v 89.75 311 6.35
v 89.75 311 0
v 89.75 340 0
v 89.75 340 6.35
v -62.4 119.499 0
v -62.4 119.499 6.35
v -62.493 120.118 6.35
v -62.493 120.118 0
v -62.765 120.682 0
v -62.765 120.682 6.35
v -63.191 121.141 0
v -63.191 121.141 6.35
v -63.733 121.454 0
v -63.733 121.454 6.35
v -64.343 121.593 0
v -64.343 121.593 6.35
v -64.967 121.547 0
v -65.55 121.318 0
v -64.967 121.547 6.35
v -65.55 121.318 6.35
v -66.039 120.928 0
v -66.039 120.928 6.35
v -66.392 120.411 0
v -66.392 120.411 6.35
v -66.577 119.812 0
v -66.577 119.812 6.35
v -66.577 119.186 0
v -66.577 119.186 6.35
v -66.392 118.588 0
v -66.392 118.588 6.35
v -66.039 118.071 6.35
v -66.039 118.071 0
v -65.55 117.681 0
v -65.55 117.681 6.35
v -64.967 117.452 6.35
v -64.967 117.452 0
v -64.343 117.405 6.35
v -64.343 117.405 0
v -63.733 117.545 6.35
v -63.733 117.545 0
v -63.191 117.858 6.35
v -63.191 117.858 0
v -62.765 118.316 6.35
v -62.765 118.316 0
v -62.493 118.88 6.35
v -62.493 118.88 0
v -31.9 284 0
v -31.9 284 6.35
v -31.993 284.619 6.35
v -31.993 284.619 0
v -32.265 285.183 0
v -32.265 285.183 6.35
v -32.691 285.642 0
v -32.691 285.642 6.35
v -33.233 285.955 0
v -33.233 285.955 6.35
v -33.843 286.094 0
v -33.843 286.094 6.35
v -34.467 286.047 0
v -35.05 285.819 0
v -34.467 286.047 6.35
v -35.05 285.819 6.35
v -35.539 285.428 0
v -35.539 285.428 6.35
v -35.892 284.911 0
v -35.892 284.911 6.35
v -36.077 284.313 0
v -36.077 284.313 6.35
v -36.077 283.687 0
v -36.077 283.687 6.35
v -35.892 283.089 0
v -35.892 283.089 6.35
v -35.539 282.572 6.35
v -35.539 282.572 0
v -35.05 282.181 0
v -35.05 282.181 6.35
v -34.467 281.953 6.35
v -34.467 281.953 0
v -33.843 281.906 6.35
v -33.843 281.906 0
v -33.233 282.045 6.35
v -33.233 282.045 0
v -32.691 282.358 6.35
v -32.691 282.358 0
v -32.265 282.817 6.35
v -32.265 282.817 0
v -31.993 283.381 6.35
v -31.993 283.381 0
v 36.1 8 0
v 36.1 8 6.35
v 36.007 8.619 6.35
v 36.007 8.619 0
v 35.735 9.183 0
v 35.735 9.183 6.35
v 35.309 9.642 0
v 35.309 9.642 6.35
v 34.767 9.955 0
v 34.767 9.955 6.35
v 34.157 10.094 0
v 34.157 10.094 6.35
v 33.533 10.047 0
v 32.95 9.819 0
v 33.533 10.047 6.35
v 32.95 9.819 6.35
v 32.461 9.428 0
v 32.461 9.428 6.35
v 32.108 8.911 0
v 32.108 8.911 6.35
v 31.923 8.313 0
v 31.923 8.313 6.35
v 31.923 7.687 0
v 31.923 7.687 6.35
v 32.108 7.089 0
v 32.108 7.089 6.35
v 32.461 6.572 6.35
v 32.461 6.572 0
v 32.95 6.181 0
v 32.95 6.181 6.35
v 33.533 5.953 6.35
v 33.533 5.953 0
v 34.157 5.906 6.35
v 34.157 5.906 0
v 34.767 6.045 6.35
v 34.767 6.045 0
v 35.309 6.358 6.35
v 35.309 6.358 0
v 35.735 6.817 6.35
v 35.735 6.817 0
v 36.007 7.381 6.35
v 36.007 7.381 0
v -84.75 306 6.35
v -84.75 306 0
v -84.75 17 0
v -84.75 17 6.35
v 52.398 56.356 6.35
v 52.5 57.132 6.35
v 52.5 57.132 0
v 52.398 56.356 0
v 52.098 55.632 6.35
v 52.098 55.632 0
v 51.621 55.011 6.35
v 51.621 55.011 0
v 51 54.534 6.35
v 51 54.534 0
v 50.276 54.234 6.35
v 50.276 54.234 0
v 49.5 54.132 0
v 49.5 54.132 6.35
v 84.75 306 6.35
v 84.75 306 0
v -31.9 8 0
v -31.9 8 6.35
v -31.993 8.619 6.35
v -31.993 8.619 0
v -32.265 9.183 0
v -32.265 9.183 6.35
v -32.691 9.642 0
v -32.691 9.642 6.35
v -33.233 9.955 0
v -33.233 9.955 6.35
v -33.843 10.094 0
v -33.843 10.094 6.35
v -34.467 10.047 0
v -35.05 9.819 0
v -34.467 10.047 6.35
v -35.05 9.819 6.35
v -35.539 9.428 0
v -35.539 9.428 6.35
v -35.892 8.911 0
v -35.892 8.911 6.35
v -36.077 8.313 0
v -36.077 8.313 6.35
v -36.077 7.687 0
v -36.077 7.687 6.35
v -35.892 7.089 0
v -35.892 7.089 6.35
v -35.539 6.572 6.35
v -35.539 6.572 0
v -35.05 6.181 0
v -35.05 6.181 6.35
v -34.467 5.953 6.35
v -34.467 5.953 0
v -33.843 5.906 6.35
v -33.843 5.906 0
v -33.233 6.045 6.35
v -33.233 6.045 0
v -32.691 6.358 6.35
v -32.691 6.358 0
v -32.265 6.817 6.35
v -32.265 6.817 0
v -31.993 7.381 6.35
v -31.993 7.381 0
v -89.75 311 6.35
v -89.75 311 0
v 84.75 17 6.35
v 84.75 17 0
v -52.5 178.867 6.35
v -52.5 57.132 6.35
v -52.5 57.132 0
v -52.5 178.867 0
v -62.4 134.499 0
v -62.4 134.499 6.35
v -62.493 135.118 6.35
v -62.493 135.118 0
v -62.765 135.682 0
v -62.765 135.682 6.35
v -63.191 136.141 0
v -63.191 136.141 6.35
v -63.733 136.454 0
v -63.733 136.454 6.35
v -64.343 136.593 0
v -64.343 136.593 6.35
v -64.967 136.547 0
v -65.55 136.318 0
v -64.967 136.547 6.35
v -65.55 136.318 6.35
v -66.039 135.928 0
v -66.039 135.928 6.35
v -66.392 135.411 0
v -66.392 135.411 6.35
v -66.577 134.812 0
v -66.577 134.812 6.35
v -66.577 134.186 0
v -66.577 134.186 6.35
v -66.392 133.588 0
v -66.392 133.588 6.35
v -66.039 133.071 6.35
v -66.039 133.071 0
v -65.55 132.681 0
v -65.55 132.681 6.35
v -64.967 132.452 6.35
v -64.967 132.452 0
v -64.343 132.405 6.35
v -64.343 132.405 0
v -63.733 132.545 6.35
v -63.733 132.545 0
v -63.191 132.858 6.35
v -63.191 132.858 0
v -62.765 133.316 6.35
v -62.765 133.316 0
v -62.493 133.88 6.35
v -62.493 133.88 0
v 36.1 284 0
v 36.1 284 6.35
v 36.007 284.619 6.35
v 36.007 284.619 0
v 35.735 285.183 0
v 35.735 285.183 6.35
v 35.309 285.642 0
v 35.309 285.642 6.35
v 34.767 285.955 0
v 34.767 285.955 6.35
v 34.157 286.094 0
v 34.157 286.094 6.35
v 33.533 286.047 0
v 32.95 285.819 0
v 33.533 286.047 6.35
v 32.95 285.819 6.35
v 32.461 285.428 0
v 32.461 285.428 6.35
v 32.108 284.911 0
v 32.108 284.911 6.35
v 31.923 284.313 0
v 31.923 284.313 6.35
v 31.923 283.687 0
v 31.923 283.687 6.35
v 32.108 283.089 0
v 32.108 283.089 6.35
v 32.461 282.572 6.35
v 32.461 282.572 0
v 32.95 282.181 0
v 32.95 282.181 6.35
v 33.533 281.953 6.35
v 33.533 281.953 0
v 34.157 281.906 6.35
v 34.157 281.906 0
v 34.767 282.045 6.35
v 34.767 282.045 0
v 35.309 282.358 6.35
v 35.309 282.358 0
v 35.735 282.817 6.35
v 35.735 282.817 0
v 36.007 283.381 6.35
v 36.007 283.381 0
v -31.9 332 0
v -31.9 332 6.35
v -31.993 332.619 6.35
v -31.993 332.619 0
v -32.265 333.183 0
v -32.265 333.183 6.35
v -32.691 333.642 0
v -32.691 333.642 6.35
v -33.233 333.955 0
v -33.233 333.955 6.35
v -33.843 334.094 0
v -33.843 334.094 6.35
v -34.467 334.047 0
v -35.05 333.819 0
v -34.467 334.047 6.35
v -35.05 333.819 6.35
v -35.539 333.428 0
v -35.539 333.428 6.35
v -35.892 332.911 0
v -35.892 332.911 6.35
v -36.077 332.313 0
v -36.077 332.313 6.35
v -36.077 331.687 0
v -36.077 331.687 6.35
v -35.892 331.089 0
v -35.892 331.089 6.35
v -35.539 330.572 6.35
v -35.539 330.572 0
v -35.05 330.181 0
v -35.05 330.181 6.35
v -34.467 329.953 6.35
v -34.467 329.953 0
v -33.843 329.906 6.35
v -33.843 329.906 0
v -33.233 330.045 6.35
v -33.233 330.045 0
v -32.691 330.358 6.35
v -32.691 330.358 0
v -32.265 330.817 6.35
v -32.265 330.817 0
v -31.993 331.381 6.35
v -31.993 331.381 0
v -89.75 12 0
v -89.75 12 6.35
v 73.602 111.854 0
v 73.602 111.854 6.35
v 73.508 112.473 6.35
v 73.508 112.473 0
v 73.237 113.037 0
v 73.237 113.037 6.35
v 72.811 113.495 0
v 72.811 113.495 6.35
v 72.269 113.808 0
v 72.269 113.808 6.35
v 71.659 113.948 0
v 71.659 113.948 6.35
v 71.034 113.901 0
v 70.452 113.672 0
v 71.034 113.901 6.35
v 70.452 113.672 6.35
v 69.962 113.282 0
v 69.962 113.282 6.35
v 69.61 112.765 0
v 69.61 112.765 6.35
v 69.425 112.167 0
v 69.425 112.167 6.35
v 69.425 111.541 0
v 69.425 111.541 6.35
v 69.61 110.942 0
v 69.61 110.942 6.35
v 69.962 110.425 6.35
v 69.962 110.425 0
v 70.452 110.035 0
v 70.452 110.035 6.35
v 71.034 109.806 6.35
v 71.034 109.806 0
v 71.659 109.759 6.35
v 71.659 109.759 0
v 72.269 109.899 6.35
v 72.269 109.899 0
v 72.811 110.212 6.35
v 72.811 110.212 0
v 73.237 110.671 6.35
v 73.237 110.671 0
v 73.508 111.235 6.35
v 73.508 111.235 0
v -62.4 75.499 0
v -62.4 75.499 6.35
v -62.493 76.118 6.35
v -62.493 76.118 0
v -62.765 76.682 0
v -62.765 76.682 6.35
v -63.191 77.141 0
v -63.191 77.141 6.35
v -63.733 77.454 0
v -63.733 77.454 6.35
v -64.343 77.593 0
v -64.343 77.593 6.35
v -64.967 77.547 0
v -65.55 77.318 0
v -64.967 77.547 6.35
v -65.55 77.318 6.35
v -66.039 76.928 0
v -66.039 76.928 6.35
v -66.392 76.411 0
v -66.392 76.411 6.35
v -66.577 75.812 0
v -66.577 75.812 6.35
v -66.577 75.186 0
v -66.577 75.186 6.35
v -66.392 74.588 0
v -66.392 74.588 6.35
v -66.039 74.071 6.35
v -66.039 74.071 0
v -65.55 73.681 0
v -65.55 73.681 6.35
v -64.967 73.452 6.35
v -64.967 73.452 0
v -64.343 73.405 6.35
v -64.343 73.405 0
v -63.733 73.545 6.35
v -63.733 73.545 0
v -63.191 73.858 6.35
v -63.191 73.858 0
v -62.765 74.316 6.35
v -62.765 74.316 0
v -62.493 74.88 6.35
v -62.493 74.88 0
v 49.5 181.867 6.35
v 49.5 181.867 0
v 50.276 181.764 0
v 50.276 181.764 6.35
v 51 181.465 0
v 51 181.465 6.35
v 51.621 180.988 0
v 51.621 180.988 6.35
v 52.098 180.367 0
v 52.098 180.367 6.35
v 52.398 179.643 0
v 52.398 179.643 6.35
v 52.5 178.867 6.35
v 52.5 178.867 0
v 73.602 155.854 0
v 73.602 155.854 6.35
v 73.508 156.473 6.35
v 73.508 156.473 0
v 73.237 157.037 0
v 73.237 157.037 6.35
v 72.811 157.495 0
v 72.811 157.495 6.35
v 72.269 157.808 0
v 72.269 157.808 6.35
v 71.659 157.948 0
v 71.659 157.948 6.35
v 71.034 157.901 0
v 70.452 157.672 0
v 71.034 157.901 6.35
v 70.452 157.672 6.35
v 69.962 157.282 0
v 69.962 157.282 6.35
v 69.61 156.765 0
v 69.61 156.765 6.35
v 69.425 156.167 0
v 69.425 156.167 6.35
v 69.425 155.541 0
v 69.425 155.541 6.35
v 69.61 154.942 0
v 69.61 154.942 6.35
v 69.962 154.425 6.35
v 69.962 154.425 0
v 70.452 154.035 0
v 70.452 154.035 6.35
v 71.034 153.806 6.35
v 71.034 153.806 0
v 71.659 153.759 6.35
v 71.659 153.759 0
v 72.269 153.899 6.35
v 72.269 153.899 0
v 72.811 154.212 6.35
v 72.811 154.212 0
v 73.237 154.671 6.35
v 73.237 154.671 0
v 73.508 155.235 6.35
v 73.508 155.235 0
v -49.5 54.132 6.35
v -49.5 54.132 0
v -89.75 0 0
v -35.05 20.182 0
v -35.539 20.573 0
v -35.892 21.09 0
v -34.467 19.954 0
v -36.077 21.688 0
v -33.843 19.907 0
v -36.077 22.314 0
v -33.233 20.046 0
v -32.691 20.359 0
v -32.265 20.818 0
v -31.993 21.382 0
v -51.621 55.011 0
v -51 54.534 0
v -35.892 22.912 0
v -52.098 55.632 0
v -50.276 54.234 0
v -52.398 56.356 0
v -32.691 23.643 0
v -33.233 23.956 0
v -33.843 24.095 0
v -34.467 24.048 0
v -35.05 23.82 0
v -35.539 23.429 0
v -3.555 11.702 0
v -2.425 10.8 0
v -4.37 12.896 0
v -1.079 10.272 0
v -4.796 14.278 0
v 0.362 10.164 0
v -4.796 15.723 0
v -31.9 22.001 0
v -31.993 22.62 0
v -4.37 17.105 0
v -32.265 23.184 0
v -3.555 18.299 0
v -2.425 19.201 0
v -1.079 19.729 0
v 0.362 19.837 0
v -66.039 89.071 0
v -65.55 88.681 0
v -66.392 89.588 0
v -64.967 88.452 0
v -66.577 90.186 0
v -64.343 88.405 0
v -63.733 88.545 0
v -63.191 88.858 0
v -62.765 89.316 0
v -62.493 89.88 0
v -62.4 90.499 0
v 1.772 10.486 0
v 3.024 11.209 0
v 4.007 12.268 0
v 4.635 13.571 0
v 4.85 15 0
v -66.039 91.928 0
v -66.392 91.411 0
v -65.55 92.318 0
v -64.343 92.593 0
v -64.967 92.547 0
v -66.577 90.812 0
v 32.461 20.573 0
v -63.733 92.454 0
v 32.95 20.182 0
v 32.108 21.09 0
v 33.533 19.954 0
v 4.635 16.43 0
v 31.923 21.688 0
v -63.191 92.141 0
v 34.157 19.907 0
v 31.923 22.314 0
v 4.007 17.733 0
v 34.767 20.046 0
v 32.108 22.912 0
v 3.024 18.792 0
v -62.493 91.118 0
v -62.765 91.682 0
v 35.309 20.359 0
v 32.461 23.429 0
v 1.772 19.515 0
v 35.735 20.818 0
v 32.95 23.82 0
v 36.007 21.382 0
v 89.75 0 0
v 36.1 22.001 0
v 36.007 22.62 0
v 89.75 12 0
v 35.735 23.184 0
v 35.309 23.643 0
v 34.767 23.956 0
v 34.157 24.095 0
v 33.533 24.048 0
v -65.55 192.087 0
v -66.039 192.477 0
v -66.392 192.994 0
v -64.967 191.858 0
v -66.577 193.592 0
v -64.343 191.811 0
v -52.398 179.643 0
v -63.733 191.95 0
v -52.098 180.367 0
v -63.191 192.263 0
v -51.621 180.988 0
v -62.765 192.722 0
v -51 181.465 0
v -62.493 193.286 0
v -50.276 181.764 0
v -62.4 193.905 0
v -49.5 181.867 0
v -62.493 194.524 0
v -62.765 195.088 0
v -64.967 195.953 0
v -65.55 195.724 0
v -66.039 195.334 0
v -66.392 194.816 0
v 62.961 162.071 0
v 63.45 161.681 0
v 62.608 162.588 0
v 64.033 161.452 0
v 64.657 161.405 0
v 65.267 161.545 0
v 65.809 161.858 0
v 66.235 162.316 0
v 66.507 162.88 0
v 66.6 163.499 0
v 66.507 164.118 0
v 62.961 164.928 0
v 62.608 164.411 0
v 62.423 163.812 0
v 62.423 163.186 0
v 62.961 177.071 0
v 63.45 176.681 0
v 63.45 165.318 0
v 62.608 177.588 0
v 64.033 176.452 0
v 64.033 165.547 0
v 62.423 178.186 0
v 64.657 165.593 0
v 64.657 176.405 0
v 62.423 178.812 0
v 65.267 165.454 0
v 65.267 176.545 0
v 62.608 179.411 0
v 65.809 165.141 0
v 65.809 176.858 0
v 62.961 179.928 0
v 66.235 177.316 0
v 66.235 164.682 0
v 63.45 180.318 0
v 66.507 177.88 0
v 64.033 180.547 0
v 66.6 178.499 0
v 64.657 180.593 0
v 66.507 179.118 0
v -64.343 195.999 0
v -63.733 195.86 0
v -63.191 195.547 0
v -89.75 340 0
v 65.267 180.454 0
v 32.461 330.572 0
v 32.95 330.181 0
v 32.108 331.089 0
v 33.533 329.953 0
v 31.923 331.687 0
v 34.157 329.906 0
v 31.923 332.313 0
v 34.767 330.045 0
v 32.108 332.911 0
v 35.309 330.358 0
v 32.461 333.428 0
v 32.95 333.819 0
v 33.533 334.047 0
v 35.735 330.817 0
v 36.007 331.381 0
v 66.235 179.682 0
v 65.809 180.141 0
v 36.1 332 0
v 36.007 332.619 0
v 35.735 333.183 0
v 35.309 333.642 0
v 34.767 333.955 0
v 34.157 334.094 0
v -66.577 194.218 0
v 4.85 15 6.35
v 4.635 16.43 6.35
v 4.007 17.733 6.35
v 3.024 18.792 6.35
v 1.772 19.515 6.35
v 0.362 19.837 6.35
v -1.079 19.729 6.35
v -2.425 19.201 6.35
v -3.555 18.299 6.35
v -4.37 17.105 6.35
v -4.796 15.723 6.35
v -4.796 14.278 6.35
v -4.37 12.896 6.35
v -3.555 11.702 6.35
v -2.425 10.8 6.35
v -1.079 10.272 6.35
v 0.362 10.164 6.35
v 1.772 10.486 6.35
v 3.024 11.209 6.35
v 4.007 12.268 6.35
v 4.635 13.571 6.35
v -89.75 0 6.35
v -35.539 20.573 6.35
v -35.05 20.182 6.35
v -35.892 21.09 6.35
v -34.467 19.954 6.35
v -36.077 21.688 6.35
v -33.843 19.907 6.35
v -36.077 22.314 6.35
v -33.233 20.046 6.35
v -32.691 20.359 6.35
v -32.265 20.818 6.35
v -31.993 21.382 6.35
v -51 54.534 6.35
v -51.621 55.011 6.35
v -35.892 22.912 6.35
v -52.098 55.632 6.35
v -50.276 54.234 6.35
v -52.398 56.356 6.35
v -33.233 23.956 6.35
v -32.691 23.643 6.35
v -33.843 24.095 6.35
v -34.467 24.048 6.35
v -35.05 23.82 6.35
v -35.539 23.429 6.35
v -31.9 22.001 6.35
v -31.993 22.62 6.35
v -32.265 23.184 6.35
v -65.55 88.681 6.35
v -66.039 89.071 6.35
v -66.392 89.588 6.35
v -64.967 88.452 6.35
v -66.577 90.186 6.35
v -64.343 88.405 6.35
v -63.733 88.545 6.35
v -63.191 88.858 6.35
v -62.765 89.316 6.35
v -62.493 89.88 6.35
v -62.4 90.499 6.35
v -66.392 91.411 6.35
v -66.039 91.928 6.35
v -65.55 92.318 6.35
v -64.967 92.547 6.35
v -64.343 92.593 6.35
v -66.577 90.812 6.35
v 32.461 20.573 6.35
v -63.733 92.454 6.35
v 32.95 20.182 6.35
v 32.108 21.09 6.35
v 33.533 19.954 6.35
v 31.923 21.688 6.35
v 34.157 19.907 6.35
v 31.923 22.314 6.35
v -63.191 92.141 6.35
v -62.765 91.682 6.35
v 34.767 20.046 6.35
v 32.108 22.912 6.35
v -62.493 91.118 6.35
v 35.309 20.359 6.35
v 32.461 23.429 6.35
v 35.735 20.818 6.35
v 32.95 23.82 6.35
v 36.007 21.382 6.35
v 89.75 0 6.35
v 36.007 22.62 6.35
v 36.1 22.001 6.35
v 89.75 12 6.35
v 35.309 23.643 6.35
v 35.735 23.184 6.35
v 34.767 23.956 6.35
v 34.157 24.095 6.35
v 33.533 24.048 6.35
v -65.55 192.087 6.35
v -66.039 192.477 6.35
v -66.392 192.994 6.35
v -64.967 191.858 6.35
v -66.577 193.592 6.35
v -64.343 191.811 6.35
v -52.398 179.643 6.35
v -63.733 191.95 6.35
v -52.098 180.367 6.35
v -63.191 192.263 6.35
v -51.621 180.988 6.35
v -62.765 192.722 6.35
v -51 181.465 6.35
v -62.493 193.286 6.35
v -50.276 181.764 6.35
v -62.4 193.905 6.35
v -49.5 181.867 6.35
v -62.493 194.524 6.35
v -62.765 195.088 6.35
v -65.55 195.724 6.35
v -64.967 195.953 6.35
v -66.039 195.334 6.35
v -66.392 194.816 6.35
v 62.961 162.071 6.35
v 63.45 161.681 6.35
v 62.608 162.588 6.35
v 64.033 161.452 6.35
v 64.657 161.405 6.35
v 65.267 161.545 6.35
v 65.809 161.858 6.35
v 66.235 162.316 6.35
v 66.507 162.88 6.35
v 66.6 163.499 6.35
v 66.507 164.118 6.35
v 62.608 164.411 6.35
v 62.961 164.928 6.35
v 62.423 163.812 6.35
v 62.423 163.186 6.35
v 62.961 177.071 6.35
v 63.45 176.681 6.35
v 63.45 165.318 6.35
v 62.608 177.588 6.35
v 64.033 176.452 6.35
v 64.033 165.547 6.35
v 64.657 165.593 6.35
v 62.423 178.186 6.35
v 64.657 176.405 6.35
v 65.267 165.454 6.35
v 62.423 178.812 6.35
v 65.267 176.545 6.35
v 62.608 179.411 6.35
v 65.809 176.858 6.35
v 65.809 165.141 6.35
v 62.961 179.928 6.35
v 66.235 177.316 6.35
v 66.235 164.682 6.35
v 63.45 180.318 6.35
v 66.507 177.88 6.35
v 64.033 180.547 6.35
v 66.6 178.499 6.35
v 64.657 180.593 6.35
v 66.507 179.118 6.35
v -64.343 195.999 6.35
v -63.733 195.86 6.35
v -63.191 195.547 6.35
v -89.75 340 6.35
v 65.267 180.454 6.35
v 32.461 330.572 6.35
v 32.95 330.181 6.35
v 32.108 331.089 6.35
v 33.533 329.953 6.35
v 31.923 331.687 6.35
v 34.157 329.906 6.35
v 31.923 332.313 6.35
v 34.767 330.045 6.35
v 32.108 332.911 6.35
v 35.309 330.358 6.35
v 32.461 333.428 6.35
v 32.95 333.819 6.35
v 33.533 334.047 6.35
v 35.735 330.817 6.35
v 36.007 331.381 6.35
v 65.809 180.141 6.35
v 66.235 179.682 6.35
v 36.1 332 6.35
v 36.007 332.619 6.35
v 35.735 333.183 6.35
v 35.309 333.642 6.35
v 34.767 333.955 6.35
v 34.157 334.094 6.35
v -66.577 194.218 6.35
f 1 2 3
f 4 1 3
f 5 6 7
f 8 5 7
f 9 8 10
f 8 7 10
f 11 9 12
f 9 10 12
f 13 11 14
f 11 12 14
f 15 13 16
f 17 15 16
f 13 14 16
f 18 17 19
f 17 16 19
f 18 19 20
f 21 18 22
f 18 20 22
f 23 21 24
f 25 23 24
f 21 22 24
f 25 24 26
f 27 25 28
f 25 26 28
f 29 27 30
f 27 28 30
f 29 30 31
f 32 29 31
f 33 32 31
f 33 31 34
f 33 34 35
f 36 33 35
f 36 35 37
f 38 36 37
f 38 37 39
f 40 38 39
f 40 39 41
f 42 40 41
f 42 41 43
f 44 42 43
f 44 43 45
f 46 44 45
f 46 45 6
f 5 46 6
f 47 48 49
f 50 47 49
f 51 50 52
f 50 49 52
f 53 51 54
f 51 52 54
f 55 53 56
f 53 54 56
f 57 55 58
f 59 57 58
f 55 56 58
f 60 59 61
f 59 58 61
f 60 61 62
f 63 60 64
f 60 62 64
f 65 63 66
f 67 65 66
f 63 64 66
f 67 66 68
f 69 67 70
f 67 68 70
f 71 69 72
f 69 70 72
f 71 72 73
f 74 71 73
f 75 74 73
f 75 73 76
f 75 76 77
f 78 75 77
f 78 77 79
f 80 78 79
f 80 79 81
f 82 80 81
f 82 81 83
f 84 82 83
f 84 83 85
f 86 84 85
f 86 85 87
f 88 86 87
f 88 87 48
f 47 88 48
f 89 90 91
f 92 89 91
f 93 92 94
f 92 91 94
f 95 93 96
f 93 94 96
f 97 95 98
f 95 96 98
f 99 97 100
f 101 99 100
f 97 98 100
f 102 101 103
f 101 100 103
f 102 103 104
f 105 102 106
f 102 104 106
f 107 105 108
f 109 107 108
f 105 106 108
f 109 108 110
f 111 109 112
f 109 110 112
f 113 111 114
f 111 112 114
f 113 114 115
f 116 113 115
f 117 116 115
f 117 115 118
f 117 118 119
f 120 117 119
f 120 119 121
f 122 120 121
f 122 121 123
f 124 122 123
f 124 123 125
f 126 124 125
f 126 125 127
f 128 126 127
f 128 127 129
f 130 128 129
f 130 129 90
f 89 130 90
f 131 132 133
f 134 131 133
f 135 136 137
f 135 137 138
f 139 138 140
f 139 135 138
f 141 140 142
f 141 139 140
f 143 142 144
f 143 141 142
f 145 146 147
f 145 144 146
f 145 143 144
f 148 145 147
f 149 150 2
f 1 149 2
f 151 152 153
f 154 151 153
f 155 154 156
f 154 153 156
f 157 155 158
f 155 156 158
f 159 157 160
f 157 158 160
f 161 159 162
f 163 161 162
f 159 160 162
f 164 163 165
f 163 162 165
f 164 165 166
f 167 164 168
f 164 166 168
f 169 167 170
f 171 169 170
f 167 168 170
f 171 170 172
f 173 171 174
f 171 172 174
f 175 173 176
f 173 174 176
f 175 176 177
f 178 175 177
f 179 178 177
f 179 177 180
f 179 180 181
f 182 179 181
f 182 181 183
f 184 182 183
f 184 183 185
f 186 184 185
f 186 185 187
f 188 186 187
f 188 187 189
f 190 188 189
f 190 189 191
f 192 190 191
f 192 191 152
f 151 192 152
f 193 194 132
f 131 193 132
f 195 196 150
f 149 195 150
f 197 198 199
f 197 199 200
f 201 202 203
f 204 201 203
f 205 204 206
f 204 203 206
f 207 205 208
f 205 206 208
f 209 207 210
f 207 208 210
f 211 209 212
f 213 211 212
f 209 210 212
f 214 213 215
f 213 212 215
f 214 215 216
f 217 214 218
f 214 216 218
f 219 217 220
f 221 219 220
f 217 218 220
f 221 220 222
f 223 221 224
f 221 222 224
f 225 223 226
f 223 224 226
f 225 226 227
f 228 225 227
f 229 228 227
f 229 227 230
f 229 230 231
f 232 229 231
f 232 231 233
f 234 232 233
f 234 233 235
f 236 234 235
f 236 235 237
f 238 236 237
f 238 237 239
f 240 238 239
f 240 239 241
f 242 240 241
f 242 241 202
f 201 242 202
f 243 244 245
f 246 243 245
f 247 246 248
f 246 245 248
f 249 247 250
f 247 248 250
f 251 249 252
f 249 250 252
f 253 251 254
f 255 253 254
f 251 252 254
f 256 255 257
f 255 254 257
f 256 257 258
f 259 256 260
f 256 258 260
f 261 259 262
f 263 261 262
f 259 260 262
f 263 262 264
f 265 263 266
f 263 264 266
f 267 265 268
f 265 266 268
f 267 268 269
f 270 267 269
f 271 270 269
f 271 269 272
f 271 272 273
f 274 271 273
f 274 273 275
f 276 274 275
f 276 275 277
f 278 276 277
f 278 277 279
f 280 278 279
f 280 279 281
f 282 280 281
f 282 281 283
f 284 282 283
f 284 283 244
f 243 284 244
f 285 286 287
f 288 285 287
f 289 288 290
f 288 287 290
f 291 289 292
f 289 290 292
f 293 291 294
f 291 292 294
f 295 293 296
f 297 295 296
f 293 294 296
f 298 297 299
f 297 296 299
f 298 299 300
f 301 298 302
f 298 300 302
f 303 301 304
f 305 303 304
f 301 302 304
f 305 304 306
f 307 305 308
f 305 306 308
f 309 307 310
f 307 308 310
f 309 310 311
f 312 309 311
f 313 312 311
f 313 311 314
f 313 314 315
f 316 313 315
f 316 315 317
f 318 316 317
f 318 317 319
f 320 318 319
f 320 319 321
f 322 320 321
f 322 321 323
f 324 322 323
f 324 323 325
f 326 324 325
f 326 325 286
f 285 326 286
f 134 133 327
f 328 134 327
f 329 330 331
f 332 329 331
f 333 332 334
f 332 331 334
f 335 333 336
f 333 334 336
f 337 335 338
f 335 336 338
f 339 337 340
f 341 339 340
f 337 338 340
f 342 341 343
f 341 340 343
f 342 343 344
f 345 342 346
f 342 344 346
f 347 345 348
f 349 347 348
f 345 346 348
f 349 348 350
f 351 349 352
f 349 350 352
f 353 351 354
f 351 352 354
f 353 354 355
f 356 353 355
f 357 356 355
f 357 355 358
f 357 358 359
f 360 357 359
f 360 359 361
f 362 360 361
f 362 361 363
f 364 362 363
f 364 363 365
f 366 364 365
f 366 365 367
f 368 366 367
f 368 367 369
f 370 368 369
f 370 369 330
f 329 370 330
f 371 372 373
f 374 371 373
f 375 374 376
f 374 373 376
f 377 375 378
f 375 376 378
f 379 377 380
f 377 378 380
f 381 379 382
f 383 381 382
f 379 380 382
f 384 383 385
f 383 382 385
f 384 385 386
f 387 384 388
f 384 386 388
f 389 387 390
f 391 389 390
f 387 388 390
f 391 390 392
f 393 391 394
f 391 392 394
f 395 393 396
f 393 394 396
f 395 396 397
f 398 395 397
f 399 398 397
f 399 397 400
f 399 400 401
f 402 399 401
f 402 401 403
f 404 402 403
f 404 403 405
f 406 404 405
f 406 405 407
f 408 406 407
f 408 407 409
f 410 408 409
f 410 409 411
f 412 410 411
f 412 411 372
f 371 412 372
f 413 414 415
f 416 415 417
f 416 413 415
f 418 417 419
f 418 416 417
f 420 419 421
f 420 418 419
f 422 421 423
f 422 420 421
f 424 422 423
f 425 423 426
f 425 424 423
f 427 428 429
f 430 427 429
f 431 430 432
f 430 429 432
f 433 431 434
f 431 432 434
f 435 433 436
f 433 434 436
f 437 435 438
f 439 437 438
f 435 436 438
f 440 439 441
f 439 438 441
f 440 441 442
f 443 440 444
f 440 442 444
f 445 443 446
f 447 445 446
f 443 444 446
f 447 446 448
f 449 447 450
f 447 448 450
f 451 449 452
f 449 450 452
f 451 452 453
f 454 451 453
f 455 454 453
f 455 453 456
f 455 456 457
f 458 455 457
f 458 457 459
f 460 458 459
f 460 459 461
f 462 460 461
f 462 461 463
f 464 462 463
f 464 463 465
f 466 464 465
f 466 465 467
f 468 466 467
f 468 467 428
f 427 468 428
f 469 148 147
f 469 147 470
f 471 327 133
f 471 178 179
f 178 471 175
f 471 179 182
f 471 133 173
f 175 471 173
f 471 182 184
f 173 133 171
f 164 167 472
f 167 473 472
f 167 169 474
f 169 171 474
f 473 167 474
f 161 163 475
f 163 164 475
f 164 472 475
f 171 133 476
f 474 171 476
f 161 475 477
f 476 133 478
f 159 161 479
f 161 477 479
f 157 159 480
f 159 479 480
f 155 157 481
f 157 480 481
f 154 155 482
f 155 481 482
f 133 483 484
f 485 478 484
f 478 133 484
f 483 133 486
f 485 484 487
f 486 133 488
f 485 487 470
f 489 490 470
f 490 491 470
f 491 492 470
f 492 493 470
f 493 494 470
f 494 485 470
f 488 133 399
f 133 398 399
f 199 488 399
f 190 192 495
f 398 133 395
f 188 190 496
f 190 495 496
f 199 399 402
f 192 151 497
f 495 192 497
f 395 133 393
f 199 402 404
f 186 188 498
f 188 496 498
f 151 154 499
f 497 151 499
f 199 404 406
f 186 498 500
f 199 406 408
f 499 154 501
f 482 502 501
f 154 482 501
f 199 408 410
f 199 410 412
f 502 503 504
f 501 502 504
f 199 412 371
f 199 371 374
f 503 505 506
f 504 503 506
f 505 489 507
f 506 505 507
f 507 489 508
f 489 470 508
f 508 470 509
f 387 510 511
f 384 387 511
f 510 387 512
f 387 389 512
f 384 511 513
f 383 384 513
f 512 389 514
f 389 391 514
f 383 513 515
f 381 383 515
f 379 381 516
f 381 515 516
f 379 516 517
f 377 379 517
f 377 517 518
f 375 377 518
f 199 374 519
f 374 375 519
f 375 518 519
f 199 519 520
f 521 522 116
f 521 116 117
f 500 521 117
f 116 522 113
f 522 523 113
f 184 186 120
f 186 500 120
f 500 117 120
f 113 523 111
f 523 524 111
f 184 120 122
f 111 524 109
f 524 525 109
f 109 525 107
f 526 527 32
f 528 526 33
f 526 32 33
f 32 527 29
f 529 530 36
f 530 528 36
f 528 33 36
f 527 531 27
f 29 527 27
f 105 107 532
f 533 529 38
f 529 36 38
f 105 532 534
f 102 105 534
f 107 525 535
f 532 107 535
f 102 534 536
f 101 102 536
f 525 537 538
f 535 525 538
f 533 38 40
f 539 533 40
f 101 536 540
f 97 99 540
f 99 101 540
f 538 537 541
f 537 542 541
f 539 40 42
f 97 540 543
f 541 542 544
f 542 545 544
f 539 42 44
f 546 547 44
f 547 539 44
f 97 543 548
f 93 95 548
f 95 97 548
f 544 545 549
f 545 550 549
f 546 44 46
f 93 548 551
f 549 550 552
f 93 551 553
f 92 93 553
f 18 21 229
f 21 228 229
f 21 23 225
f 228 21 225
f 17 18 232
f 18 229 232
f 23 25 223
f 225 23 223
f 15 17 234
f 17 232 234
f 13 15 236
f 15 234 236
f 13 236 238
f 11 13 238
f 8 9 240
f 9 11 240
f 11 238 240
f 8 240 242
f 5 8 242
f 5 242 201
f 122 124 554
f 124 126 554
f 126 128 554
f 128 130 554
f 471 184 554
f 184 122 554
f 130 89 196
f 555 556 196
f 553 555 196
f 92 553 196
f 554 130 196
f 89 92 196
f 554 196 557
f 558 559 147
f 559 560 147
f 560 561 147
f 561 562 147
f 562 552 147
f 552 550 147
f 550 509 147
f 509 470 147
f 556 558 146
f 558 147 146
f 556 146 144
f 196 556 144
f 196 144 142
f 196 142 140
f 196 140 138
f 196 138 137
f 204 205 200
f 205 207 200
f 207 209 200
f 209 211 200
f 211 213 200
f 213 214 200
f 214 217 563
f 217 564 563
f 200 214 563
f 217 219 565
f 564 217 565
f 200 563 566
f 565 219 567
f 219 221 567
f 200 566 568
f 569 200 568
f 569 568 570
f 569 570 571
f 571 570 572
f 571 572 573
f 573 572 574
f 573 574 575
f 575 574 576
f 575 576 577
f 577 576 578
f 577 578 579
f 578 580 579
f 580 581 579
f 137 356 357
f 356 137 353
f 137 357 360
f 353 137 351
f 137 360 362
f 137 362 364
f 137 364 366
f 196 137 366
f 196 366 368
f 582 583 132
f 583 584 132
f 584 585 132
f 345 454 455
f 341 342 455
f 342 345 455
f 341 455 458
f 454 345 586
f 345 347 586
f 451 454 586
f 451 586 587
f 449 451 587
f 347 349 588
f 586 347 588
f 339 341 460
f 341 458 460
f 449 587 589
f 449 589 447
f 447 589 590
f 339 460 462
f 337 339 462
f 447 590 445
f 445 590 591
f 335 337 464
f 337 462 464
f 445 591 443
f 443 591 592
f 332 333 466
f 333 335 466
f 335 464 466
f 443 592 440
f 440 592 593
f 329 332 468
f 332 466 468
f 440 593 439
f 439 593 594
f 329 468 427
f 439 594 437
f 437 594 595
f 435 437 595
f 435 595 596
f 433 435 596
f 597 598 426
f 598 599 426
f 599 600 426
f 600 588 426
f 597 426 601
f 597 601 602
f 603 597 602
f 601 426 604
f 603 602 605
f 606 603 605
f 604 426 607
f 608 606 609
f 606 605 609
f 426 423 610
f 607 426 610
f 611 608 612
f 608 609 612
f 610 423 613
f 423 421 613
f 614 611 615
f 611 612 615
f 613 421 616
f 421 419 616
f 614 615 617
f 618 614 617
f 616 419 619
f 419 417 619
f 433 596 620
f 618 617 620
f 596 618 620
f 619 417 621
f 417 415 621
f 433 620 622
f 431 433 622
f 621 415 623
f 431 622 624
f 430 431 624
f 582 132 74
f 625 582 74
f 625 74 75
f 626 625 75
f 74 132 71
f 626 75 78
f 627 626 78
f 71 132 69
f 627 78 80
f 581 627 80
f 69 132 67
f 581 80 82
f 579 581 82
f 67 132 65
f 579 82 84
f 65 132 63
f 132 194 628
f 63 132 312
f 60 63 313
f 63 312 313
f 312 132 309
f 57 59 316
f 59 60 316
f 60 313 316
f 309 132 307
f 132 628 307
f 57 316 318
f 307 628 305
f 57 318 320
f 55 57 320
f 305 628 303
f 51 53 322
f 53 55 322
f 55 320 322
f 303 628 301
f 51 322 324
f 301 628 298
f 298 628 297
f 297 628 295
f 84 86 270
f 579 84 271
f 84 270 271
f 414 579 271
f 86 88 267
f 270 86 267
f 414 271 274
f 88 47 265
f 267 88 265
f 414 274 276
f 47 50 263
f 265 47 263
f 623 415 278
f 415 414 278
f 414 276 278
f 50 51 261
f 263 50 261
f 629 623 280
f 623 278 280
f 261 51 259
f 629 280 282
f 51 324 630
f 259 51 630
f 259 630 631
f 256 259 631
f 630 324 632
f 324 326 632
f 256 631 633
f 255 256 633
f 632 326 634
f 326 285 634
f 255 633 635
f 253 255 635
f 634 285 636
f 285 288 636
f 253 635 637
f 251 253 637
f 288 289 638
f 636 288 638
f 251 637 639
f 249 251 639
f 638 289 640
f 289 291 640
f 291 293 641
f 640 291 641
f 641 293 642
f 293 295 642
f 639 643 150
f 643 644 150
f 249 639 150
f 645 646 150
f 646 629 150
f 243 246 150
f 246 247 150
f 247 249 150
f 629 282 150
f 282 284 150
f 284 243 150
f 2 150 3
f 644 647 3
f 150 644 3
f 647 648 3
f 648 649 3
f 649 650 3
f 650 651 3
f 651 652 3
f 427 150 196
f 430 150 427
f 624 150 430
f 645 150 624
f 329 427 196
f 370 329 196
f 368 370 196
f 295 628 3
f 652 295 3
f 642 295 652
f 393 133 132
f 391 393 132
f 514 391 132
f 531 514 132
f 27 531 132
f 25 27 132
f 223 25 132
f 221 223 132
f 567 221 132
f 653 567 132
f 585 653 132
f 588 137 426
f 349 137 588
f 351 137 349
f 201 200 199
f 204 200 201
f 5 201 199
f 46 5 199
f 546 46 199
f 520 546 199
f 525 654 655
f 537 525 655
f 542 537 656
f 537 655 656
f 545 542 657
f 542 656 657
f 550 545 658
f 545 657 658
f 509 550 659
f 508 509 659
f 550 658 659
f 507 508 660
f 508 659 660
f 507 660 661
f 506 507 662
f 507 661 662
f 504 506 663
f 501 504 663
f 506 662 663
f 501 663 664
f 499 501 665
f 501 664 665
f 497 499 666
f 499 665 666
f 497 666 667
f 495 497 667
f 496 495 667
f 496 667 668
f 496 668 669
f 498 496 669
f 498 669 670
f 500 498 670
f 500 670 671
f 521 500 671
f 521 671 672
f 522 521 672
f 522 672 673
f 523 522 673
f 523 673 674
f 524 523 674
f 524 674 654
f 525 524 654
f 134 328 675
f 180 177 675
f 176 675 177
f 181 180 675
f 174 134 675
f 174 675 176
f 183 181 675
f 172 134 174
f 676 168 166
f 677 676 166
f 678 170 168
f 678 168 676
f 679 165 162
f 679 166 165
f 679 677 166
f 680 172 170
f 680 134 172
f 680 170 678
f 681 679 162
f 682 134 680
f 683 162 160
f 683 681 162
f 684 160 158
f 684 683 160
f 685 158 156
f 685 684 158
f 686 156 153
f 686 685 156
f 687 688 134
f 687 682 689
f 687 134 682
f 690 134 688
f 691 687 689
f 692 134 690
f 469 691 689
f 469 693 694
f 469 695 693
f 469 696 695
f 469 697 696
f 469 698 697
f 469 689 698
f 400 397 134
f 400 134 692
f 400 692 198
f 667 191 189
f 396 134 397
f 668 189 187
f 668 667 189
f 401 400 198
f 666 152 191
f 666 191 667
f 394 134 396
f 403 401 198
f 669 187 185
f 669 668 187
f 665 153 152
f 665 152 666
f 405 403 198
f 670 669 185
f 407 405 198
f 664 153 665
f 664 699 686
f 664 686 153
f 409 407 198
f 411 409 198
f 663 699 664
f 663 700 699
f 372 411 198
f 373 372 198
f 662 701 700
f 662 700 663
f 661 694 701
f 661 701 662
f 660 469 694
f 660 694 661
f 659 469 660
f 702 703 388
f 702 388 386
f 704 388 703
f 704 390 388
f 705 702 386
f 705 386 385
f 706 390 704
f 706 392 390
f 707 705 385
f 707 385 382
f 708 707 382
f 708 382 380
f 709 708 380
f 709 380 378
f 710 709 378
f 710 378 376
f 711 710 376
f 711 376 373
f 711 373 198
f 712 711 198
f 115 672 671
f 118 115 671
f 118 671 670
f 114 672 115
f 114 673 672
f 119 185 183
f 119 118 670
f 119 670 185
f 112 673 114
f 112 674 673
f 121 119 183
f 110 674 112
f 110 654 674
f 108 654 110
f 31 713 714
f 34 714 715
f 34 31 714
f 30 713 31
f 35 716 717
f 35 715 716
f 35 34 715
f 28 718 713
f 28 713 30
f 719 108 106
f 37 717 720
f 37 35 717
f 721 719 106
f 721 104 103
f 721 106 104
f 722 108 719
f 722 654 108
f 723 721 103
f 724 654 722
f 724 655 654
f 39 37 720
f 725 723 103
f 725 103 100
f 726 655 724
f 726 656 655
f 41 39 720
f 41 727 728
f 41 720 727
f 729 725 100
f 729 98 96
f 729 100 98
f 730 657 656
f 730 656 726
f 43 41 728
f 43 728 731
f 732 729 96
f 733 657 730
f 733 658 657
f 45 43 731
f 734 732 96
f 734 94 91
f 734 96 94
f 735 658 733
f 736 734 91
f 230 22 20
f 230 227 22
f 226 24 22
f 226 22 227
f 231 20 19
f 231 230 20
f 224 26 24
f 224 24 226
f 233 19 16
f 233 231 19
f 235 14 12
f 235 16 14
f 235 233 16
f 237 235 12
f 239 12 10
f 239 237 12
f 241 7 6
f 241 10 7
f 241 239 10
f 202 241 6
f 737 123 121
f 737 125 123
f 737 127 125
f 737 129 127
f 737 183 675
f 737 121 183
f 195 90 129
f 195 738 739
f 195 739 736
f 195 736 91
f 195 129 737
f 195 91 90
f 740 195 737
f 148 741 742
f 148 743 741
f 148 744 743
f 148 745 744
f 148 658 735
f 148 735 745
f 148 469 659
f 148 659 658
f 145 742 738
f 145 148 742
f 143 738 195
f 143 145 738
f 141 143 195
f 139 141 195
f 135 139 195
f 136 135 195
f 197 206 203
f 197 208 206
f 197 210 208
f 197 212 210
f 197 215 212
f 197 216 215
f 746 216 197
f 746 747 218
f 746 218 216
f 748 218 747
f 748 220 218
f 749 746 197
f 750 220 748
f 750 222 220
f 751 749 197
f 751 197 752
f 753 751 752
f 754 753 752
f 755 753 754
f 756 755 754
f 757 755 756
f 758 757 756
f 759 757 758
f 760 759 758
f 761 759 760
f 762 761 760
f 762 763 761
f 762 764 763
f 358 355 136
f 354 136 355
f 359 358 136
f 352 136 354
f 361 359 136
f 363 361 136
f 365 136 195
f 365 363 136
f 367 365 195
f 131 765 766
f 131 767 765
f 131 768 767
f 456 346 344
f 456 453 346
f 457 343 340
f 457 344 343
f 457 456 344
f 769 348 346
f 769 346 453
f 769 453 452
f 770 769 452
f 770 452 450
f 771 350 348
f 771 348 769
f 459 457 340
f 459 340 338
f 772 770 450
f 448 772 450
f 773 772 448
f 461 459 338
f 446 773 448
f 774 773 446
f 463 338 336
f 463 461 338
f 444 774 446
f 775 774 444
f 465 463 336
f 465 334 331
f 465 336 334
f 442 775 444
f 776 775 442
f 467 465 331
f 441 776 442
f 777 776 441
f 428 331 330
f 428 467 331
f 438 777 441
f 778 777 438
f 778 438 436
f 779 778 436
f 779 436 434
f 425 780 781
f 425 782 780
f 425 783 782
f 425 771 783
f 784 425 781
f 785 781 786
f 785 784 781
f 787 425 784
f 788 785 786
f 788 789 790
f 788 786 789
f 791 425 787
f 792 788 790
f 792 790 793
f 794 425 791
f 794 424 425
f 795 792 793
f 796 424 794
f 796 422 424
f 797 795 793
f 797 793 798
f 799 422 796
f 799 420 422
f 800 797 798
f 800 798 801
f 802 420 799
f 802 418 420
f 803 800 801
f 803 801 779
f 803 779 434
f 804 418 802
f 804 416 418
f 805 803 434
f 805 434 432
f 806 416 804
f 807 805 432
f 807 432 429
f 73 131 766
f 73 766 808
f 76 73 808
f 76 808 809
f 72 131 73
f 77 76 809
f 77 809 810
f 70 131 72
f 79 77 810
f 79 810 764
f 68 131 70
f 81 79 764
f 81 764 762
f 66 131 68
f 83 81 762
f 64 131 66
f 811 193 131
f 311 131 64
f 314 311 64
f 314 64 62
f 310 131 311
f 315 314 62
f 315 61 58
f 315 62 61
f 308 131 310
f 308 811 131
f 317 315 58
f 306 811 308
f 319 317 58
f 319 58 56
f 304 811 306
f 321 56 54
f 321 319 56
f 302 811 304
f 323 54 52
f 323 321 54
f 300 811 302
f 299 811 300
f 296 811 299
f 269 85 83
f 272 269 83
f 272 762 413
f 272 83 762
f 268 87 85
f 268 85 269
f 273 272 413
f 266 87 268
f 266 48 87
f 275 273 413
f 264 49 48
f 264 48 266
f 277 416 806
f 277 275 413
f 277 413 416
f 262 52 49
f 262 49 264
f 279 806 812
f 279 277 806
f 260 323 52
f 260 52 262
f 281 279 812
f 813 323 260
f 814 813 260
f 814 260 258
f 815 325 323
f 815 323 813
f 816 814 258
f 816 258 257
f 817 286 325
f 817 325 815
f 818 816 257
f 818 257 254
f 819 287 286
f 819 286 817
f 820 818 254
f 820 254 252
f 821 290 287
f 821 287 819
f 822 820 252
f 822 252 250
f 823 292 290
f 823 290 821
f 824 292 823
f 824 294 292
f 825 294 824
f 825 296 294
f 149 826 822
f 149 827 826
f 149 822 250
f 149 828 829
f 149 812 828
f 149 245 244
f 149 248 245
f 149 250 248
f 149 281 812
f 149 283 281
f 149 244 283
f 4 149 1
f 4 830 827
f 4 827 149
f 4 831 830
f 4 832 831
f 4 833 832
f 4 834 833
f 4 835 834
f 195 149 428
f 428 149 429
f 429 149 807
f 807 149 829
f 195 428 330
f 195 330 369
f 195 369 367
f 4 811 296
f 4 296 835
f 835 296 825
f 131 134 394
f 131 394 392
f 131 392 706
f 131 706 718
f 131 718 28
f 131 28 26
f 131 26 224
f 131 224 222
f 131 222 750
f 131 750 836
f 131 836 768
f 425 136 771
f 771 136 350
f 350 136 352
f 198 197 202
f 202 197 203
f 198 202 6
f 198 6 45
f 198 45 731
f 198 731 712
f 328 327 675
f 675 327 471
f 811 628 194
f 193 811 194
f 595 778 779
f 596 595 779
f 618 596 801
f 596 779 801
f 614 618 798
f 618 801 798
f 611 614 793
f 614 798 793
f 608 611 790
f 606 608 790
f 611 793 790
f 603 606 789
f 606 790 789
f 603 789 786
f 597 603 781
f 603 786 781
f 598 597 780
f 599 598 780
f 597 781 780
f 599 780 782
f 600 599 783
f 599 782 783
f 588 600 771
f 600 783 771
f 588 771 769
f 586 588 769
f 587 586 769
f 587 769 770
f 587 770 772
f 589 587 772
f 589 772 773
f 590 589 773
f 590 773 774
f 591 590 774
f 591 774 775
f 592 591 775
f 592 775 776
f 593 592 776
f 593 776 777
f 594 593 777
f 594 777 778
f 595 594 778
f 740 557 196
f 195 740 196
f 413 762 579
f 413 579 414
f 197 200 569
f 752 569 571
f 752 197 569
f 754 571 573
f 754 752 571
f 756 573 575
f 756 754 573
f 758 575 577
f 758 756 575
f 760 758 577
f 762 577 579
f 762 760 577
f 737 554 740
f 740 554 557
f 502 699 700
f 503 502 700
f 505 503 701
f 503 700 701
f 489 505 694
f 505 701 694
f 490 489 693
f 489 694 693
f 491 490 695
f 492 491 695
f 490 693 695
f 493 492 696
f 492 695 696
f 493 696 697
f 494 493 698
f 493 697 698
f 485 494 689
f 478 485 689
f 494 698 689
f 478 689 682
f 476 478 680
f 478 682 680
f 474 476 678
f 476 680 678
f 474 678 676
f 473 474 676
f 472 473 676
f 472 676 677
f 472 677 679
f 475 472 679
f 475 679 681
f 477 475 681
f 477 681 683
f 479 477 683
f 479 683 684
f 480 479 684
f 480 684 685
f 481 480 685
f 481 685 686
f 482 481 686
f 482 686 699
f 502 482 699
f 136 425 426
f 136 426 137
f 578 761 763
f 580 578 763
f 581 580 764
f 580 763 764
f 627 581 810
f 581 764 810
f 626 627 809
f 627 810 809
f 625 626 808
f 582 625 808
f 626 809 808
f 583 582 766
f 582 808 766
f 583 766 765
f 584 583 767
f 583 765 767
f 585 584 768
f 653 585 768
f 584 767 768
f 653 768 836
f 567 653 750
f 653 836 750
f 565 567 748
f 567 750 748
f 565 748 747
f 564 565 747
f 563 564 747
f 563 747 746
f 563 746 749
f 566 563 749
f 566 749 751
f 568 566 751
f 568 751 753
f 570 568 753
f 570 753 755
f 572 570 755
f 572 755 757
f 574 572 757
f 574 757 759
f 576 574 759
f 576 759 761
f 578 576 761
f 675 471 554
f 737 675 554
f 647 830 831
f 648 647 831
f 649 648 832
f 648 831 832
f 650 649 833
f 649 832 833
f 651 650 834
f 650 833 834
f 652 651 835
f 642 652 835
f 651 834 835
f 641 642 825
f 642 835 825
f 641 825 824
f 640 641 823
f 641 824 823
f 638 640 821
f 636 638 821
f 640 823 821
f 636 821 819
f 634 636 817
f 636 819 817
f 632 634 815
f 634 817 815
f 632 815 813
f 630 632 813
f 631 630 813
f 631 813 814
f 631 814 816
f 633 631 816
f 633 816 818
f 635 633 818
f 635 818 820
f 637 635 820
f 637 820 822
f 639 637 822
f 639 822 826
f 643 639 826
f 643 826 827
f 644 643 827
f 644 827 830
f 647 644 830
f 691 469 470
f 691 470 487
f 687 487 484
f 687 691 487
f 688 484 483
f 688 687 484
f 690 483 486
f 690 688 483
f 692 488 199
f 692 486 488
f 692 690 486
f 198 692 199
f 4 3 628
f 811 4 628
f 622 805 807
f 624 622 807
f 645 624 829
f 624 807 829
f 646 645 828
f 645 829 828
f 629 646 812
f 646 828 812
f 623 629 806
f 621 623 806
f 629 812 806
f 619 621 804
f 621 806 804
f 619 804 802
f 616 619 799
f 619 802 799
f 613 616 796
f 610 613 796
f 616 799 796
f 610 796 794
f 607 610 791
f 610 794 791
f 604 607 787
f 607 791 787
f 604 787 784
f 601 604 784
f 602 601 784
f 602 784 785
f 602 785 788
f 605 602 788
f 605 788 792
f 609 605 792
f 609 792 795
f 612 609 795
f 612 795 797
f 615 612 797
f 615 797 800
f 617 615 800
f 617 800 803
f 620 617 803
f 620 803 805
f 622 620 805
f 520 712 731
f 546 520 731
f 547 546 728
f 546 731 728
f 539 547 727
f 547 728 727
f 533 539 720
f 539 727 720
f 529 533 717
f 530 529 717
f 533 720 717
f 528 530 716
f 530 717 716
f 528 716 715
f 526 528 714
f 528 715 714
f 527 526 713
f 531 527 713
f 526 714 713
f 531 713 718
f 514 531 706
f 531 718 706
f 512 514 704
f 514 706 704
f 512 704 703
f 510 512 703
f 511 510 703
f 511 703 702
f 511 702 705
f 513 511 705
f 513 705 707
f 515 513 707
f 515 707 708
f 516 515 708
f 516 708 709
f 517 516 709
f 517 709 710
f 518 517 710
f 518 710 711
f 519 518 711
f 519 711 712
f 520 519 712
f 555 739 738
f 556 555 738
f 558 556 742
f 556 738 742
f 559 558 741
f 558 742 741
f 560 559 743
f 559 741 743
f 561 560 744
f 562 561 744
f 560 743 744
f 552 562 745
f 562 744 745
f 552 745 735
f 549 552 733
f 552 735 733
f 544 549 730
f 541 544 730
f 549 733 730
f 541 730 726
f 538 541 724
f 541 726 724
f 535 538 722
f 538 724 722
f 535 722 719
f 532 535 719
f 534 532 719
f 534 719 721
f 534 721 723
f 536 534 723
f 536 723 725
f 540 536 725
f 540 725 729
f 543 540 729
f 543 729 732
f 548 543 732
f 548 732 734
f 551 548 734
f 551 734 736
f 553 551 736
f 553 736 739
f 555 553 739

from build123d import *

# Parameters (mm, degrees)
BOSS_EXTRUDE1_DEPTH = 6.35
CUT_EXTRUDE1_DEPTH  = 7.35
SKETCH3_R           = 2.1
CUT_EXTRUDE2_DEPTH  = 7.35
SKETCH4_R           = 2.1
CUT_EXTRUDE3_DEPTH  = 7.35
SKETCH5_R           = 4.85
CUT_EXTRUDE4_DEPTH  = 7.35


with BuildPart() as part:
    # Sketch1 → Boss-Extrude1 (new body)
    with BuildSketch(Plane.XY):
        Polygon((-89.75, 0), (89.75, 0), (89.75, 12), (84.75, 17), (84.75, 306), (89.75, 311), (89.75, 340), (-89.75, 340), (-89.75, 311), (-84.75, 306), (-84.75, 17), (-89.75, 12), align=None)
    extrude(amount=BOSS_EXTRUDE1_DEPTH)

    # Sketch2 → Cut-Extrude1 (cut, through all)
    with BuildSketch(Plane.XY.offset(6.35)):
        with BuildLine():
            Line((-49.5, 181.866529721), (49.5, 181.866529721))
            ThreePointArc((49.5, 181.866529721), (51.621320344, 180.987850064), (52.5, 178.866529721))
            Line((52.5, 178.866529721), (52.5, 57.132206767))
            ThreePointArc((52.5, 57.132206767), (51.621320344, 55.010886424), (49.5, 54.132206767))
            Line((49.5, 54.132206767), (-49.5, 54.132206767))
            ThreePointArc((-49.5, 54.132206767), (-51.621320344, 55.010886424), (-52.5, 57.132206767))
            Line((-52.5, 57.132206767), (-52.5, 178.866529721))
            ThreePointArc((-52.5, 178.866529721), (-51.621320344, 180.987850064), (-49.5, 181.866529721))
        make_face()
    extrude(amount=-CUT_EXTRUDE1_DEPTH, mode=Mode.SUBTRACT)

    # Sketch3 → Cut-Extrude2 (cut, through all)
    with BuildSketch(Plane.XY.offset(6.35)):
        with Locations((-64.5, 75.499368245)):
            Circle(SKETCH3_R)
        with Locations((-64.5, 90.499368245)):
            Circle(SKETCH3_R)
        with Locations((-64.5, 134.499368243)):
            Circle(SKETCH3_R)
        with Locations((-64.5, 119.499368243)):
            Circle(SKETCH3_R)
        with Locations((-64.5, 193.905249142)):
            Circle(SKETCH3_R)
        with Locations((64.5, 163.499368242)):
            Circle(SKETCH3_R)
        with Locations((64.5, 178.499368242)):
            Circle(SKETCH3_R)
        with Locations((71.501617277, 155.85352801)):
            Circle(SKETCH3_R)
        with Locations((71.501617277, 111.85352804)):
            Circle(SKETCH3_R)
    extrude(amount=-CUT_EXTRUDE2_DEPTH, mode=Mode.SUBTRACT)

    # Sketch4 → Cut-Extrude3 (cut, through all)
    with BuildSketch(Plane.XY.offset(6.35)):
        with Locations((-34, 332)):
            Circle(SKETCH4_R)
        with Locations((34, 332)):
            Circle(SKETCH4_R)
        with Locations((34, 284)):
            Circle(SKETCH4_R)
        with Locations((-34, 284)):
            Circle(SKETCH4_R)
        with Locations((-34, 8)):
            Circle(SKETCH4_R)
        with Locations((-34, 22.001)):
            Circle(SKETCH4_R)
        with Locations((34, 22.001)):
            Circle(SKETCH4_R)
        with Locations((34, 8)):
            Circle(SKETCH4_R)
    extrude(amount=-CUT_EXTRUDE3_DEPTH, mode=Mode.SUBTRACT)

    # Sketch5 → Cut-Extrude4 (cut, through all)
    with BuildSketch(Plane.XY.offset(6.35)):
        with Locations((0, 15.0005)):
            Circle(SKETCH5_R)
    extrude(amount=-CUT_EXTRUDE4_DEPTH, mode=Mode.SUBTRACT)


solid = part.part
